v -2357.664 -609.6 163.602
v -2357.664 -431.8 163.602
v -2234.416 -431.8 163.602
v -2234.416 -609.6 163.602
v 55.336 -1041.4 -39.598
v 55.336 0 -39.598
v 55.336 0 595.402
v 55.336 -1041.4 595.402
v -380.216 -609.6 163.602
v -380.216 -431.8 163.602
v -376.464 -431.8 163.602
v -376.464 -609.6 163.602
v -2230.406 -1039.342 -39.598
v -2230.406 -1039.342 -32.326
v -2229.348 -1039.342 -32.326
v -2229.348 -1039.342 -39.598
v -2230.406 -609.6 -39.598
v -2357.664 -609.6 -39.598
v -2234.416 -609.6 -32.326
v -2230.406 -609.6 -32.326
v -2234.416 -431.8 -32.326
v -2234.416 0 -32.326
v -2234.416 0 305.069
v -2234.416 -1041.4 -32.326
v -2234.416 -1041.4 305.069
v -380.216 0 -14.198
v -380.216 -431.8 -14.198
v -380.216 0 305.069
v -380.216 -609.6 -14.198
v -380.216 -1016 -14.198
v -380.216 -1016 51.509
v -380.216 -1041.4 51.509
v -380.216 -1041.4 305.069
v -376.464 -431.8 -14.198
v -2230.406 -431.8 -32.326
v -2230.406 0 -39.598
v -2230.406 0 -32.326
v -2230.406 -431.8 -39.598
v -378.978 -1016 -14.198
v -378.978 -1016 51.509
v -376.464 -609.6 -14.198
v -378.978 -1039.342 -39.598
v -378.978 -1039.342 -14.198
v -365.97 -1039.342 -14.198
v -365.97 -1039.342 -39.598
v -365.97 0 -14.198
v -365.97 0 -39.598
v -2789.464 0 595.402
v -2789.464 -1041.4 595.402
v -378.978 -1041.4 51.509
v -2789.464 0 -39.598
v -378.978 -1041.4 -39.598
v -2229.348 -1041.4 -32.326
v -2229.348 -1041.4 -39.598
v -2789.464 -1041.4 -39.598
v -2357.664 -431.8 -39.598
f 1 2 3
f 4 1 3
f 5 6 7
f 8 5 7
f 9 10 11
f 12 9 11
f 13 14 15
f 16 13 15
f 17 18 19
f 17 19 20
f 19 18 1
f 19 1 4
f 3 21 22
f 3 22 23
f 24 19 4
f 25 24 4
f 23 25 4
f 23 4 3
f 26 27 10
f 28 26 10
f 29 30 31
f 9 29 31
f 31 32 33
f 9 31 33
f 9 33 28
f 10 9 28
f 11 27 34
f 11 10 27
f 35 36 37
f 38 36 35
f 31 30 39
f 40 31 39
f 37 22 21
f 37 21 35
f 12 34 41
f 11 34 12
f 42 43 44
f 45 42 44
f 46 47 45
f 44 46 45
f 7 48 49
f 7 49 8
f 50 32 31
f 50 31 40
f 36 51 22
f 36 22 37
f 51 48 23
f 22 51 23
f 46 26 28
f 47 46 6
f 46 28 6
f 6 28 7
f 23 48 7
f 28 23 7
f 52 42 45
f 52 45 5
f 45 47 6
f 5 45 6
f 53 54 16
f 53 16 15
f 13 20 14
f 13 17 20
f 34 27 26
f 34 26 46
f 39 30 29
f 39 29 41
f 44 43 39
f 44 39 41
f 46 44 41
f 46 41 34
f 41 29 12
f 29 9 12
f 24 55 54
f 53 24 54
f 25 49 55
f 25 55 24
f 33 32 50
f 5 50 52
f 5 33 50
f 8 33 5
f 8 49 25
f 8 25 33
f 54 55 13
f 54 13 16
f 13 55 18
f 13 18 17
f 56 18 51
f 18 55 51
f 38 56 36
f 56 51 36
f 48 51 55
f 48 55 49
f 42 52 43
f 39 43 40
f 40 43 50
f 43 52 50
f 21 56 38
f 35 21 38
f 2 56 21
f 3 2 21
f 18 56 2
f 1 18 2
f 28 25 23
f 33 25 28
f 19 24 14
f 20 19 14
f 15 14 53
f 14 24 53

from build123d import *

# Parameters (mm, degrees)
F0_W     = 2844.8
F0_H     = 635
F1_DEPTH = 1041.4
F2_T     = -431.8
F3_W     = 1854.2
F3_H     = 337.394852
F4_DEPTH = 1041.4
F5_W     = 1864.435851
F5_H     = 1044.369351
F6_DEPTH = 25.4
F7_W     = 1850.370407
F7_H     = 173.659369
F8_DEPTH = 25.4


with BuildPart() as f1:
    # F0 (on Front) → F1 (new body)
    with BuildSketch(Plane.XZ):
        with Locations((-1367.063681, 277.902381)):
            Rectangle(F0_W, F0_H)
    extrude(amount=F1_DEPTH)

    # F2
    f2_openings = [f1.faces().sort_by_distance(p)[0] for p in [
        (-1367.063681, -520.7, -39.597619),
    ]]
    offset(amount=F2_T, openings=f2_openings)

    # F3 (on face) → F4 (cut)
    with BuildSketch(Plane.XZ.offset(1041.4)):
        with Locations((-1307.315948, 136.371216)):
            Rectangle(F3_W, F3_H)
    extrude(amount=-F4_DEPTH, mode=Mode.SUBTRACT)

    # F5 (on face) → F6 (cut)
    with BuildSketch(Plane(origin=(0, 0, -39.597619), x_dir=(1, 0, 0), z_dir=(0, 0, -1))):
        with Locations((-1298.187882, 517.15737)):
            Rectangle(F5_W, F5_H)
    extrude(amount=-F6_DEPTH, mode=Mode.SUBTRACT)

    # F7 (on face) → F8 (cut)
    with BuildSketch(Plane.XZ.offset(1041.4)):
        with Locations((-1304.16298, -35.320341)):
            Rectangle(F7_W, F7_H)
    extrude(amount=-F8_DEPTH, mode=Mode.SUBTRACT)


solid = f1.part
